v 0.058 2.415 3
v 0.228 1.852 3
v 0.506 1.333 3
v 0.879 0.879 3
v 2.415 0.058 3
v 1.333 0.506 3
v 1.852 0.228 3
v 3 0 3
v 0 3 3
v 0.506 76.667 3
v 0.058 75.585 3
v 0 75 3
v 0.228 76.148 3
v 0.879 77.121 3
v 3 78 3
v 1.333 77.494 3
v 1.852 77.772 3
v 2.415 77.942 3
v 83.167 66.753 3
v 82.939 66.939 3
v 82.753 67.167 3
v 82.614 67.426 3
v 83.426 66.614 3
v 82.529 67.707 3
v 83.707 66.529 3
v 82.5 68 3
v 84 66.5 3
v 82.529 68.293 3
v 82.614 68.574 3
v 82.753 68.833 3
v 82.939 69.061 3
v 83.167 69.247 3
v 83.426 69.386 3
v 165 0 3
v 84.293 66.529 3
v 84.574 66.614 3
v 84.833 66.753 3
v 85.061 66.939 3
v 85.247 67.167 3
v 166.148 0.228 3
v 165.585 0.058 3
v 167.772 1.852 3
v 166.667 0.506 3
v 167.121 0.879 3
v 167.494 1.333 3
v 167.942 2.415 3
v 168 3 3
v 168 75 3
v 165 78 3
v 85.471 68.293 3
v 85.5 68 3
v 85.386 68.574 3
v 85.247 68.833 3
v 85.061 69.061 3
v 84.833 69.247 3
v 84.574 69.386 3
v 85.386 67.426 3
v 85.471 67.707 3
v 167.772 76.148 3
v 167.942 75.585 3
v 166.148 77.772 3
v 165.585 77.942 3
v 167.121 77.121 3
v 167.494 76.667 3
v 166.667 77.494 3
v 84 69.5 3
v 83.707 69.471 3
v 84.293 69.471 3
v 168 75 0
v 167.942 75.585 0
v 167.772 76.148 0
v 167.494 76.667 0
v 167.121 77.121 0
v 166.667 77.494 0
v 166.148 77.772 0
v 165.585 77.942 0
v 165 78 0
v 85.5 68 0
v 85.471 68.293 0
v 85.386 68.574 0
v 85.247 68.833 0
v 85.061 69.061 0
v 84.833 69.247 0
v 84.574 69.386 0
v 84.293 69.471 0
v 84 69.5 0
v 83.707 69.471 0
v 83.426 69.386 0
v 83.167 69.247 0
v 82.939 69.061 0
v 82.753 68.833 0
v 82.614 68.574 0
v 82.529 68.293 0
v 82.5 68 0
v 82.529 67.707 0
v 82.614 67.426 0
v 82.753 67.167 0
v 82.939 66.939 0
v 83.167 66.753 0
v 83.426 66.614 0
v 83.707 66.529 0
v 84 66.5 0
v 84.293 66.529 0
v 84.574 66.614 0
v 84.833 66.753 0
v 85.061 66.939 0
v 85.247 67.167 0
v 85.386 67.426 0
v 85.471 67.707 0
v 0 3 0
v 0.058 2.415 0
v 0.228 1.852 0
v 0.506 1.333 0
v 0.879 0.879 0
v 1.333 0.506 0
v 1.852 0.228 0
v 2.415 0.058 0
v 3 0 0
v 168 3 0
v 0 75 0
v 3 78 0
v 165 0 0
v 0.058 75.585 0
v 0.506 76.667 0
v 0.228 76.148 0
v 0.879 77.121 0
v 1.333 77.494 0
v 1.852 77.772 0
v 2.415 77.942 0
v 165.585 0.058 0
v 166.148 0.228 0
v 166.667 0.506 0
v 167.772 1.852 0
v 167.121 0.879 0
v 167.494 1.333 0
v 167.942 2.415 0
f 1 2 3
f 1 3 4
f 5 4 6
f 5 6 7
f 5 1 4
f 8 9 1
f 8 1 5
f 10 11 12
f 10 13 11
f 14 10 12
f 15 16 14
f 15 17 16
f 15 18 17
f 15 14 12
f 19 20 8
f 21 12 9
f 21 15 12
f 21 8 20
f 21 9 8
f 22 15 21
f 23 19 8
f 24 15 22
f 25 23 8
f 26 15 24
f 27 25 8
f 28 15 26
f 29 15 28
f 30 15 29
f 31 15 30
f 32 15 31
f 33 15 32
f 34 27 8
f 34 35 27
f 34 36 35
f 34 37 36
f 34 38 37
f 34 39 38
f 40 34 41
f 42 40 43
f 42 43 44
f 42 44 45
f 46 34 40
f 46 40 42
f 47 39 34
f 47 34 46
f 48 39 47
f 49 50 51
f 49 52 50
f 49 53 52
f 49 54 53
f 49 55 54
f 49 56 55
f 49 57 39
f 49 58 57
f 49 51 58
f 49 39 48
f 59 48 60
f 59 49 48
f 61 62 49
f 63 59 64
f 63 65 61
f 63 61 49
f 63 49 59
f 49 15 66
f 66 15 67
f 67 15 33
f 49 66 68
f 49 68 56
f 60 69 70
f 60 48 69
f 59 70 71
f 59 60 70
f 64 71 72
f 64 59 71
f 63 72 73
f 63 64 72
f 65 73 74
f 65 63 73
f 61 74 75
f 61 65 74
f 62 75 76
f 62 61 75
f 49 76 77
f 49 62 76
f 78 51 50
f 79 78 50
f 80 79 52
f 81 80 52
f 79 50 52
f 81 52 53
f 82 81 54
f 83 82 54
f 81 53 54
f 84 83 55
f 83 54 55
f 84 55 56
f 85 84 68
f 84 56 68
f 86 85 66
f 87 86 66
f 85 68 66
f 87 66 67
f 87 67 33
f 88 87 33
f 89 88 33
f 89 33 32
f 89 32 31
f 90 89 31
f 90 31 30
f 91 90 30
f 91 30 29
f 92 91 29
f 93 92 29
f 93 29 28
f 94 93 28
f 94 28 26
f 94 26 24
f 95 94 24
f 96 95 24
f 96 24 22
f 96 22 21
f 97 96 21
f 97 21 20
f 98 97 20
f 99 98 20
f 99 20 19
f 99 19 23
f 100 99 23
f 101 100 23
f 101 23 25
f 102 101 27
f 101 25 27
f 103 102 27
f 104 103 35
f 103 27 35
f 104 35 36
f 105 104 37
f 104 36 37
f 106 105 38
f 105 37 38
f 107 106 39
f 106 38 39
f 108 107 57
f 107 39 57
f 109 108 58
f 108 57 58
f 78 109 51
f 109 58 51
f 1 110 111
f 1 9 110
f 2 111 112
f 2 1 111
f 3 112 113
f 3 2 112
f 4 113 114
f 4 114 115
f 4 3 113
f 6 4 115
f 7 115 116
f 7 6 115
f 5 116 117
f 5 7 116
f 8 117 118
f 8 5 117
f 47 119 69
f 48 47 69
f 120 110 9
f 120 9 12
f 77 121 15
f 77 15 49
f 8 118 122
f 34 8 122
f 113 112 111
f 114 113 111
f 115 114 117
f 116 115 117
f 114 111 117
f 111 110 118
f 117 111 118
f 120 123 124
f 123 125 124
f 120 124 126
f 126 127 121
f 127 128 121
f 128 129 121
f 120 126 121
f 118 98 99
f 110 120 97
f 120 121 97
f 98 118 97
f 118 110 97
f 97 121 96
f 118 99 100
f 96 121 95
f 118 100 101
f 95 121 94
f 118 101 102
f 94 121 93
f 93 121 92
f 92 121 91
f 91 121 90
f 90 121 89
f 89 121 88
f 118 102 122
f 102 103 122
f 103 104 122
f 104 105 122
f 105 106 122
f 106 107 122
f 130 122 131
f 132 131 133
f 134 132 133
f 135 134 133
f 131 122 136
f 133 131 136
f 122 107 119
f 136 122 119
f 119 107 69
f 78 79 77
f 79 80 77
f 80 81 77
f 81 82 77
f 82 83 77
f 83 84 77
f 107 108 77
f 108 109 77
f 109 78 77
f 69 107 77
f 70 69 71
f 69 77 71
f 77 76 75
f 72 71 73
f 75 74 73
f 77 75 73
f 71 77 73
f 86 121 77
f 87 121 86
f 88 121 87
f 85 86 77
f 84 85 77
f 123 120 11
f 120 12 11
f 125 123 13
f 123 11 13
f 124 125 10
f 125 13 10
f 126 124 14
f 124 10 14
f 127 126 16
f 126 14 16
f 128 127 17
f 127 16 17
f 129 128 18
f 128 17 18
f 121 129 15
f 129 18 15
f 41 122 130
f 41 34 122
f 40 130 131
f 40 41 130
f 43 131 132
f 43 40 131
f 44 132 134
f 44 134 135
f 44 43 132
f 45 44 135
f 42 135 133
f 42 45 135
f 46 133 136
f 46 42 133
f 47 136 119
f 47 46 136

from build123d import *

# Parameters (mm, degrees)
ESQUISSE1_W             = 168
ESQUISSE1_H             = 78
BOSS_EXTRU_1_DEPTH      = 3
CONG_1_R                = 3
ESQUISSE2_R             = 1.5
ENL_V_MAT_EXTRU_1_DEPTH = 186.248481775


with BuildPart() as part:
    # Esquisse1 → Boss.-Extru.1 (new body)
    with BuildSketch(Plane.XY):
        with Locations((84, 39)):
            Rectangle(ESQUISSE1_W, ESQUISSE1_H)
    extrude(amount=BOSS_EXTRU_1_DEPTH)

    # Congé1
    cong_1_edges = [part.edges().sort_by_distance(p)[0] for p in [
        (0, 78, 1.5),
        (168, 78, 1.5),
        (168, 0, 1.5),
        (0, 0, 1.5),
    ]]
    fillet(cong_1_edges, radius=CONG_1_R)

    # Esquisse2 → Enlèv. mat.-Extru.1 (cut, through all)
    with BuildSketch(Plane.XY.offset(3)):
        with Locations((84, 68)):
            Circle(ESQUISSE2_R)
    extrude(amount=-ENL_V_MAT_EXTRU_1_DEPTH, mode=Mode.SUBTRACT)


solid = part.part
